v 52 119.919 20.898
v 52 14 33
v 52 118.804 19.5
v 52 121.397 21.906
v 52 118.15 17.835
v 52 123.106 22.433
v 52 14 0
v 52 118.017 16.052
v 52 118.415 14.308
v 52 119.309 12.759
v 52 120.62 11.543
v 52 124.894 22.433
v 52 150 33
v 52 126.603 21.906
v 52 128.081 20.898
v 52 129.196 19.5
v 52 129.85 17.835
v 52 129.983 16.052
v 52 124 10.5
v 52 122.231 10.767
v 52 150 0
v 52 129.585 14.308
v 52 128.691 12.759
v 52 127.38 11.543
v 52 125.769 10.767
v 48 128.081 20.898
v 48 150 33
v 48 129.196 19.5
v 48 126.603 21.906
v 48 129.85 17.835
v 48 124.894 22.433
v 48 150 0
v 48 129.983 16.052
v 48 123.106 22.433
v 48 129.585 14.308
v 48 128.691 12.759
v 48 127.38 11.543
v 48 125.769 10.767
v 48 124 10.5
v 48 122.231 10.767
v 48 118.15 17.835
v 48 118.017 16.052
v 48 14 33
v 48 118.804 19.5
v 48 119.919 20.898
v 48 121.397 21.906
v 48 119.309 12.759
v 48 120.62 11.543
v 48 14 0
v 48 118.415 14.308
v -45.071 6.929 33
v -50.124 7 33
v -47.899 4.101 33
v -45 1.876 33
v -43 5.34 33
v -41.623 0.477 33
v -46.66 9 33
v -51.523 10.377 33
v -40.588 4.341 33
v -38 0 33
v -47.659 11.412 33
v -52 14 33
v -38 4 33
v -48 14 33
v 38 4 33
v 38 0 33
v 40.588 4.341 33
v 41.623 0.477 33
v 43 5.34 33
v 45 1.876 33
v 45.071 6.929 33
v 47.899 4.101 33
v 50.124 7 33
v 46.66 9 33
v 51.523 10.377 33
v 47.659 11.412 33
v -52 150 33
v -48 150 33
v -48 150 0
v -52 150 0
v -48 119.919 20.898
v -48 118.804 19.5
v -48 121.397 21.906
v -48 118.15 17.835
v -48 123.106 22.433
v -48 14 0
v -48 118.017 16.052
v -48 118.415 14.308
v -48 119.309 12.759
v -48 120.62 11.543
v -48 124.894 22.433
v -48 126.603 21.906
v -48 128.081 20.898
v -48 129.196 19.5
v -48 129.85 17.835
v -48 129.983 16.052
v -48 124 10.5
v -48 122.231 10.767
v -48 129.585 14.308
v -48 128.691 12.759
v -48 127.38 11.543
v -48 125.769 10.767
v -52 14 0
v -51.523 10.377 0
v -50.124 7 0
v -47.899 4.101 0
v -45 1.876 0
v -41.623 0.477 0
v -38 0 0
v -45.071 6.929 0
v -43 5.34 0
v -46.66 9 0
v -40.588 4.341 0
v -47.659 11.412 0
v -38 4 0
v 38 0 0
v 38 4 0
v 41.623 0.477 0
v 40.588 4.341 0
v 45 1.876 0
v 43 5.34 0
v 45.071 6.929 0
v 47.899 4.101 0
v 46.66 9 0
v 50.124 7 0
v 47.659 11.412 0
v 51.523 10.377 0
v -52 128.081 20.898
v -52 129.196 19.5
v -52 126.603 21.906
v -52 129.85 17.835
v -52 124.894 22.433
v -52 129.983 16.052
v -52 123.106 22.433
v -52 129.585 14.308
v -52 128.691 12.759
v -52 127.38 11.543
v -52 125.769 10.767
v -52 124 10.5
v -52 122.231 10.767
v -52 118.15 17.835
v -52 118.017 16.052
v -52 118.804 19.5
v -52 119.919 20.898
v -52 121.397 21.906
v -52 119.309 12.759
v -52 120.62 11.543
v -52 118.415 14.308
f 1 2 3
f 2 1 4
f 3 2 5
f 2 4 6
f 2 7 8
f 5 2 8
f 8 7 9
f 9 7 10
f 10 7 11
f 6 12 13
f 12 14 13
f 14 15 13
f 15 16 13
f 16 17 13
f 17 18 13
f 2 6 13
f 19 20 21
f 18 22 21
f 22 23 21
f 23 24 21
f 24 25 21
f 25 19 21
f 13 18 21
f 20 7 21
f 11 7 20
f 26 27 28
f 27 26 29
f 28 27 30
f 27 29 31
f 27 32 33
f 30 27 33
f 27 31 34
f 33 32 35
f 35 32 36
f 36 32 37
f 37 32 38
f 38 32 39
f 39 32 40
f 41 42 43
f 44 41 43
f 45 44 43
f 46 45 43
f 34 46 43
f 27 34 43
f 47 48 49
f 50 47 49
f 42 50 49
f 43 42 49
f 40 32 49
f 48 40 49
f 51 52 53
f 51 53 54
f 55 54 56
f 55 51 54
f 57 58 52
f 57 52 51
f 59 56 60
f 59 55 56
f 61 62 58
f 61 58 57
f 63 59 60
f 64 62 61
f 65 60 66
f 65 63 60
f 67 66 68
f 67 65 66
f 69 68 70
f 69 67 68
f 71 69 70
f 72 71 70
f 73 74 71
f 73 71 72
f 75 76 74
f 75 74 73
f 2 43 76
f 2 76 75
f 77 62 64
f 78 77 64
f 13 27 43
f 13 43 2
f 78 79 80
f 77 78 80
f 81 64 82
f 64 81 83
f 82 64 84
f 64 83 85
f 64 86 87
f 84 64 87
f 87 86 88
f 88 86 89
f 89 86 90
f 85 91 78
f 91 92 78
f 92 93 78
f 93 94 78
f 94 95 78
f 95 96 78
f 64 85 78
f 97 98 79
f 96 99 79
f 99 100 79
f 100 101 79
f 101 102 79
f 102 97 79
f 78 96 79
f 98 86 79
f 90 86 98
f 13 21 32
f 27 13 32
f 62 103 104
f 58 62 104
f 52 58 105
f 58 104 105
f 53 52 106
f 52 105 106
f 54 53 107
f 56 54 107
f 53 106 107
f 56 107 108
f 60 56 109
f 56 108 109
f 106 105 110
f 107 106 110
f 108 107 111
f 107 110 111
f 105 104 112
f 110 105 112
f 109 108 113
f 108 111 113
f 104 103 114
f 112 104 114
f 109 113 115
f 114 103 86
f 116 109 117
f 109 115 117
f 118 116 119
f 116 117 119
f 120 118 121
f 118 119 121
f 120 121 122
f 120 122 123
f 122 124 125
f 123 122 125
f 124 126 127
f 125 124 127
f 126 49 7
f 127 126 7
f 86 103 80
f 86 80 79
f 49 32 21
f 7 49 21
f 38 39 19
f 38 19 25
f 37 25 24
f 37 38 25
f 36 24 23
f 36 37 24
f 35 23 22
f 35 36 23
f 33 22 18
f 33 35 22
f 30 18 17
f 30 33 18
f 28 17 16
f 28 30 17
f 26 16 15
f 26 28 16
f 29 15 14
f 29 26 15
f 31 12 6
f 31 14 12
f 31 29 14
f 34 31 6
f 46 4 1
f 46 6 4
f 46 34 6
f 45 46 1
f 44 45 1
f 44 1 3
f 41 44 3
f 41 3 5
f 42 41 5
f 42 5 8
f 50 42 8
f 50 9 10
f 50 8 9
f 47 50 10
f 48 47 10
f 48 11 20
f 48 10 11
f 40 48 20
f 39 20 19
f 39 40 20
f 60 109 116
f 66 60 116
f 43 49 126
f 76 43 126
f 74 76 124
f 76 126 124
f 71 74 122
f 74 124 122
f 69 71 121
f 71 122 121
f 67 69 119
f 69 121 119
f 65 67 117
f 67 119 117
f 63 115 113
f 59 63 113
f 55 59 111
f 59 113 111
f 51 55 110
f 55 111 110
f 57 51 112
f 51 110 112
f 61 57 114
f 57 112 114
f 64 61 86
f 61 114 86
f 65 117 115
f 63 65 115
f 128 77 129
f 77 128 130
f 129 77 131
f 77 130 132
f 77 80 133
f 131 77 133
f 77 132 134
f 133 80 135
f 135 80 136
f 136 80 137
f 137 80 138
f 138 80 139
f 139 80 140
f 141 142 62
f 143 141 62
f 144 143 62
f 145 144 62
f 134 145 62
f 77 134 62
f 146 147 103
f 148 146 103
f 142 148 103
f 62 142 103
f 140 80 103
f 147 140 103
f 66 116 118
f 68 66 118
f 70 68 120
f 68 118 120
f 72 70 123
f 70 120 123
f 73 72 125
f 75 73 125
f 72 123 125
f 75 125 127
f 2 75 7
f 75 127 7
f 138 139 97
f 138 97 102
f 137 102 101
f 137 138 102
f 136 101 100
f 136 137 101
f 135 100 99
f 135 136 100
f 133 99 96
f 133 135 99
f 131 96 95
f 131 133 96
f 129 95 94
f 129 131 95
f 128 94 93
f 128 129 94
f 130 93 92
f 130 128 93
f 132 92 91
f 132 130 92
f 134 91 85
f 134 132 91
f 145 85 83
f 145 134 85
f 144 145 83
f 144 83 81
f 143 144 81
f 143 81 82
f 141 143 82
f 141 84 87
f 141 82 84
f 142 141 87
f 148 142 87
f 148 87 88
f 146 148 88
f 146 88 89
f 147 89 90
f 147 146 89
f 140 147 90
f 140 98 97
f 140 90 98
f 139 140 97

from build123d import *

# Parameters (mm, degrees)
EXTRUDE_1_DEPTH          = 33
CUT_EXTRUDE_1_DEPTH      = 186.485848517
CUT_EXTRUDE_1_DEPTH_BACK = 186.485848517
SKETCH_2_R               = 6


with BuildPart() as part:
    # Эскиз1 → Бобышка-Вытянуть1 (new body)
    with BuildSketch(Plane.XY):
        with BuildLine():
            Line((0, 0), (38, 0))
            ThreePointArc((38, 0), (47.899494937, 4.100505063), (52, 14))
            Line((52, 14), (52, 150))
            Line((52, 150), (48, 150))
            Line((48, 150), (48, 14))
            ThreePointArc((48, 14), (45.071067812, 6.928932188), (38, 4))
            Line((38, 4), (0, 4))
            Line((0, 4), (-38, 4))
            ThreePointArc((-38, 4), (-45.071067812, 6.928932188), (-48, 14))
            Line((-48, 14), (-48, 150))
            Line((-48, 150), (-52, 150))
            Line((-52, 150), (-52, 14))
            ThreePointArc((-52, 14), (-47.899494937, 4.100505063), (-38, 0))
            Line((-38, 0), (0, 0))
        make_face()
    extrude(amount=EXTRUDE_1_DEPTH)

    # Эскиз2 → Вырез-Вытянуть1 (cut, two sides: drawn at the far end of the back side and taken through both)
    with BuildSketch(Plane(origin=(52, 0, 0), x_dir=(0, 0, -1), z_dir=(1, 0, 0)).offset(-CUT_EXTRUDE_1_DEPTH_BACK)):
        with Locations((-16.5, 124)):
            Circle(SKETCH_2_R)
    extrude(amount=CUT_EXTRUDE_1_DEPTH + CUT_EXTRUDE_1_DEPTH_BACK, mode=Mode.SUBTRACT)


solid = part.part
